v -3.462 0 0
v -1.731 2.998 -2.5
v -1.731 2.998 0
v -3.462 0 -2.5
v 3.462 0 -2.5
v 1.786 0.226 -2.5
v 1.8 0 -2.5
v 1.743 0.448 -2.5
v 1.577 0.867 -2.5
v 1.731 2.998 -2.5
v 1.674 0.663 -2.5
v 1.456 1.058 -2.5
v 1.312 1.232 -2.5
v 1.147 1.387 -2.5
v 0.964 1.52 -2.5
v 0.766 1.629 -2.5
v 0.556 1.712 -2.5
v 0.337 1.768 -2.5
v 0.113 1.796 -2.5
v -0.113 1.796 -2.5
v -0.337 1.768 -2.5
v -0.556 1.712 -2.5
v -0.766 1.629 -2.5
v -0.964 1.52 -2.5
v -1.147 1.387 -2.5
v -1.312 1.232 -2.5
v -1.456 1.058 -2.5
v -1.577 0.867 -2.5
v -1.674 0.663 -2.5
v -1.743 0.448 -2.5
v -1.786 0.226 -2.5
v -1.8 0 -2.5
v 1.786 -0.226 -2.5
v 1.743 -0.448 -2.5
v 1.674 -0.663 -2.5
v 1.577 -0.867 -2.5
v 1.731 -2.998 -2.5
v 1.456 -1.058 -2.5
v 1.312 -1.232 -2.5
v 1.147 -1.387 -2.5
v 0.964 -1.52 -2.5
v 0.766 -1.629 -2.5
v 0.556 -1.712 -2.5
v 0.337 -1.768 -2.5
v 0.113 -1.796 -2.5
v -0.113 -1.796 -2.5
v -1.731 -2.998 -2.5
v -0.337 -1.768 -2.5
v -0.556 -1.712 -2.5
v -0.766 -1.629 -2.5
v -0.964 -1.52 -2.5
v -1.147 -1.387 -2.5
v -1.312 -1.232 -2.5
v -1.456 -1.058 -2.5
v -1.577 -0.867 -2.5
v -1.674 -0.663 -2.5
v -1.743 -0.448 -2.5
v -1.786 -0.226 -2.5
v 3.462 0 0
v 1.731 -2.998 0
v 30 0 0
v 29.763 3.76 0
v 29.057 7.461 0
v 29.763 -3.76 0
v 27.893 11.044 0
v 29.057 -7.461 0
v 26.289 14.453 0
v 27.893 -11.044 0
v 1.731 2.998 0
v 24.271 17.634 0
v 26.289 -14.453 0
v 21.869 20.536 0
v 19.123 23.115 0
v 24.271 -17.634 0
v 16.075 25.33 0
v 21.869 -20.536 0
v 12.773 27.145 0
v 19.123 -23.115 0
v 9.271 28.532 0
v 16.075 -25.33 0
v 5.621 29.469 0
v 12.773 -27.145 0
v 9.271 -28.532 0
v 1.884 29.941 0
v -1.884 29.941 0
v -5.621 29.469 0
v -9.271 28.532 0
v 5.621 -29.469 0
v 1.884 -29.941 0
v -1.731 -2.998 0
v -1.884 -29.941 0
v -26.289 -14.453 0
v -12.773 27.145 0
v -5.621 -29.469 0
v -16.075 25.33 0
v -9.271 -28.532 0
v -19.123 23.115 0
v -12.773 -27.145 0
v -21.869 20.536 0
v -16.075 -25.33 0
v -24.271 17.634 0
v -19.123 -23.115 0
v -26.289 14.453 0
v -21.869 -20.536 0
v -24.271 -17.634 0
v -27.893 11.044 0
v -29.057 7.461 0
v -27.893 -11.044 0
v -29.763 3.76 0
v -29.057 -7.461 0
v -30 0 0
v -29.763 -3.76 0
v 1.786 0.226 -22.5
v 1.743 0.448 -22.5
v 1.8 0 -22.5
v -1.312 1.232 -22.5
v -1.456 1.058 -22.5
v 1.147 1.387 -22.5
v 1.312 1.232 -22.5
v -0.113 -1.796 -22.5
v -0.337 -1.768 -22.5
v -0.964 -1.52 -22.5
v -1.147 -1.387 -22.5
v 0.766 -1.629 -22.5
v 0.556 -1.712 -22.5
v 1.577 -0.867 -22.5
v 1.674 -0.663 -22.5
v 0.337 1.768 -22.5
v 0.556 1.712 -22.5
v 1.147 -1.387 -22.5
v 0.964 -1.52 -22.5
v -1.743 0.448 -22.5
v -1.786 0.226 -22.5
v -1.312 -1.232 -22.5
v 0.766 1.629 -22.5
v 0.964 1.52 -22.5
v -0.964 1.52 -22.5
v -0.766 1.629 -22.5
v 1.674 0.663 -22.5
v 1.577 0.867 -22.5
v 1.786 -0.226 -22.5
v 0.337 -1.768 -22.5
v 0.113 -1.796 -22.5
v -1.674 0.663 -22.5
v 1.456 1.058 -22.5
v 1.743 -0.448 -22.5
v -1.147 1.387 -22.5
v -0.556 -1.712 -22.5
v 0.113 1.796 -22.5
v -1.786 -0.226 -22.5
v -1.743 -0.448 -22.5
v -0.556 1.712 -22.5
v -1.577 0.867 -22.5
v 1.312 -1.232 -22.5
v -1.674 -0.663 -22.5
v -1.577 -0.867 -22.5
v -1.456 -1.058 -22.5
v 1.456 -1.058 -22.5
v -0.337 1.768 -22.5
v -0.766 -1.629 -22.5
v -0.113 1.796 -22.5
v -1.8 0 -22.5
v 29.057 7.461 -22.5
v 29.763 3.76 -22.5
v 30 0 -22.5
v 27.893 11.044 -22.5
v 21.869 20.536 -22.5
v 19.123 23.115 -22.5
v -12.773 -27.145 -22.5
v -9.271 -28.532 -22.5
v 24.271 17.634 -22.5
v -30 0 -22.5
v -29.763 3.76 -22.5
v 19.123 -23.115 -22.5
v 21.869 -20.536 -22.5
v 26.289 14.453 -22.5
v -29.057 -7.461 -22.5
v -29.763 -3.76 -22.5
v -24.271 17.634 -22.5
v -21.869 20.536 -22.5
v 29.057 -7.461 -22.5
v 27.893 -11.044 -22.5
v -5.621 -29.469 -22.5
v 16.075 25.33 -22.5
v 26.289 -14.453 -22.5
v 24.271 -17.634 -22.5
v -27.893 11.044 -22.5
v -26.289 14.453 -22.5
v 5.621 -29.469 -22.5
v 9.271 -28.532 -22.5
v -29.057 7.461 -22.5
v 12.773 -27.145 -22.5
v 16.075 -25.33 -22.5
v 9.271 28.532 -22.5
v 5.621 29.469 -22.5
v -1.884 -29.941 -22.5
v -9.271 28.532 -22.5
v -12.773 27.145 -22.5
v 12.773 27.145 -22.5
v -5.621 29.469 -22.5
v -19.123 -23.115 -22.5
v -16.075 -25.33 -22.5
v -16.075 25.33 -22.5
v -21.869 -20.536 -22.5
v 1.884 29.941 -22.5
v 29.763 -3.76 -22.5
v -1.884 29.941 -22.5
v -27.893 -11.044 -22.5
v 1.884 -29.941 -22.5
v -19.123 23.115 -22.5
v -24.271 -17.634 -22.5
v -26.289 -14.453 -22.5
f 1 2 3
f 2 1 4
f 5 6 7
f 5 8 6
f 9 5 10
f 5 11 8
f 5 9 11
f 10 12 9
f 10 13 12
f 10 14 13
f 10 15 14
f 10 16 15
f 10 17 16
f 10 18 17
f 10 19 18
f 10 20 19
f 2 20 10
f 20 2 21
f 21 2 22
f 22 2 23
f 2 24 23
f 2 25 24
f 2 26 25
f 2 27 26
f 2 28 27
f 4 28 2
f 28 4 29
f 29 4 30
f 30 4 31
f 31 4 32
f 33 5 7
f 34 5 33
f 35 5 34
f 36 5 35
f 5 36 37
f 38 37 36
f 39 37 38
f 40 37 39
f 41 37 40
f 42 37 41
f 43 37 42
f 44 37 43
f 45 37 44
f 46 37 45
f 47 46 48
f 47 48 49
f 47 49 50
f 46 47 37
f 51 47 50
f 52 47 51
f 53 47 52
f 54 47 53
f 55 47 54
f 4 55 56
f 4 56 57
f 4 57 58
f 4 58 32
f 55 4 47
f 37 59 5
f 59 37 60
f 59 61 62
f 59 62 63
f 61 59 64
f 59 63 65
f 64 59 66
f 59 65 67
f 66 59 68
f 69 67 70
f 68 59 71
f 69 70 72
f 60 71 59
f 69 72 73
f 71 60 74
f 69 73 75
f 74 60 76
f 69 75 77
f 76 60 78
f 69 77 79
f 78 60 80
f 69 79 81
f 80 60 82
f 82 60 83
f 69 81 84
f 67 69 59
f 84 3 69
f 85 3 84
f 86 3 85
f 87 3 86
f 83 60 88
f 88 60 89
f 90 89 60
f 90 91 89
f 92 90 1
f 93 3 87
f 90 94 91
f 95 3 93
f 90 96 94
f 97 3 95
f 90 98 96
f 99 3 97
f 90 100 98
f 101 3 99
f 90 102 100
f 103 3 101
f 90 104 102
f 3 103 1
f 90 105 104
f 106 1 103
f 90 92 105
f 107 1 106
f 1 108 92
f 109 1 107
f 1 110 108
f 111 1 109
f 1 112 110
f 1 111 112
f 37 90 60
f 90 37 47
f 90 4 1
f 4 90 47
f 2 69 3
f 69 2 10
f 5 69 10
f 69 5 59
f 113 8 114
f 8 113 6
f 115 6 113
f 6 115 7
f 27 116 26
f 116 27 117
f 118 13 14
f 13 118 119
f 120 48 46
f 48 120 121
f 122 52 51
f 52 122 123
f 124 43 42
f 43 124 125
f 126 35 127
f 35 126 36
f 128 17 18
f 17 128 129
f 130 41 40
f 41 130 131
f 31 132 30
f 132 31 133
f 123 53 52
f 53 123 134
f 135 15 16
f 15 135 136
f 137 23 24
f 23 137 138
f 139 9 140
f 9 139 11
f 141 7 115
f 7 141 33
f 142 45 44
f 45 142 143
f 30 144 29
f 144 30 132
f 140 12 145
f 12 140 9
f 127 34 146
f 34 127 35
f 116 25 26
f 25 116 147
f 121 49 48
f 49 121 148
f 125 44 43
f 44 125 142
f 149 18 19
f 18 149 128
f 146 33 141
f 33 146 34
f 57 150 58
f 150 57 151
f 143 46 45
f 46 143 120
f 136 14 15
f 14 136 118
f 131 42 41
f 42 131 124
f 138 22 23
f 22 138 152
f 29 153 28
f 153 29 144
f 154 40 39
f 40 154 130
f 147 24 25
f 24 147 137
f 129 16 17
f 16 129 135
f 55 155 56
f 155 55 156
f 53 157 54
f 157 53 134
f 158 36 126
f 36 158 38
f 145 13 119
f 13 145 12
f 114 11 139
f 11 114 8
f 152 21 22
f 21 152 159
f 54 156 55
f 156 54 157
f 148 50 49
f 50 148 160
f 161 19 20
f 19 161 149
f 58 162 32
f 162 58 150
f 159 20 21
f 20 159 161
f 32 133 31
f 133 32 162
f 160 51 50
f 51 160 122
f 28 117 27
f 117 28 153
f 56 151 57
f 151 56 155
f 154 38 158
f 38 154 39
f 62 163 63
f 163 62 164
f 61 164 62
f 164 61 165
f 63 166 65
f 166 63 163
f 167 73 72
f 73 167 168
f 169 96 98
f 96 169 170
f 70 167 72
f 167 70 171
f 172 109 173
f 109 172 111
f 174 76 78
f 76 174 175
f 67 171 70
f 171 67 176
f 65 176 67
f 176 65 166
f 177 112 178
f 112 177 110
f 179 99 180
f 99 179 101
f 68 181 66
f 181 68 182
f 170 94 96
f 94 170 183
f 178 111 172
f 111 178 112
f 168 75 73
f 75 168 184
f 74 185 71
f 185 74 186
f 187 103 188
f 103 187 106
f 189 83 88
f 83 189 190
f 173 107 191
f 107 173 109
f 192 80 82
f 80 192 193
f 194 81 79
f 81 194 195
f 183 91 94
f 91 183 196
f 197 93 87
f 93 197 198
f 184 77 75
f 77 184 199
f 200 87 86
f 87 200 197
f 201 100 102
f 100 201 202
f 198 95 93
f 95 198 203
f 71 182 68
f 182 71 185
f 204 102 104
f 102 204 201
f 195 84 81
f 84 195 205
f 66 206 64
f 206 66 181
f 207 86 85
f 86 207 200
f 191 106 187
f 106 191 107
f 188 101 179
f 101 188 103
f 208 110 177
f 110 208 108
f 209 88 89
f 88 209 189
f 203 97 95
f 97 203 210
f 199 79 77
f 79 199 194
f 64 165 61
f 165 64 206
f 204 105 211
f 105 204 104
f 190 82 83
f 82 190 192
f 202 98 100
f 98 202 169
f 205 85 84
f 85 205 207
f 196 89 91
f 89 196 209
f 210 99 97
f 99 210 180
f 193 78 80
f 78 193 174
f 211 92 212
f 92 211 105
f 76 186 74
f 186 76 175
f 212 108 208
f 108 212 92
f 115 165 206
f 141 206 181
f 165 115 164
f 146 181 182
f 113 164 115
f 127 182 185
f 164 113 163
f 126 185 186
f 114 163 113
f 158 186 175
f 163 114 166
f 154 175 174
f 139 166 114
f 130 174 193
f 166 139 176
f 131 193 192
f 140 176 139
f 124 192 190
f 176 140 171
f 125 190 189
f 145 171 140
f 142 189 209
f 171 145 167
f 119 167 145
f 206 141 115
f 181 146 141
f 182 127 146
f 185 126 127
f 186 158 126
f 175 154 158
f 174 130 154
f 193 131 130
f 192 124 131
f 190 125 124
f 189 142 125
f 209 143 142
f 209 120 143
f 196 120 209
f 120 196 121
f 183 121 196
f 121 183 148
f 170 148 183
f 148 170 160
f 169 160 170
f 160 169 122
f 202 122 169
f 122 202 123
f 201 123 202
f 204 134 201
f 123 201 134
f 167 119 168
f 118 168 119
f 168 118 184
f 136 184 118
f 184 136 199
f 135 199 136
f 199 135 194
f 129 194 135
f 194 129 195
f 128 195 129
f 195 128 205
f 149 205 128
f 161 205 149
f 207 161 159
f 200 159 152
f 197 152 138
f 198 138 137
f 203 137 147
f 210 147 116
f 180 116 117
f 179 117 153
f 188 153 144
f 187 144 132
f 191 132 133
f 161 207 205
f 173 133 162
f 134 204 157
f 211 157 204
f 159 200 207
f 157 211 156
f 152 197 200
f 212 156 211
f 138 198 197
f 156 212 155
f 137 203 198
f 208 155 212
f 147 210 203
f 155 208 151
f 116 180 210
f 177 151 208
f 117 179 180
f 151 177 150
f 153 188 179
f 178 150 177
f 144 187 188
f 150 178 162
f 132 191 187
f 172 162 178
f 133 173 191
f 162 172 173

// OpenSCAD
$fn = 50;

difference() {
	union() {
		translate(v = [0, 0, -22.5]) {
			cylinder(h = 22.5, r = 30.0);
		}
	}
	union() {
		translate(v = [0, 0, 0]) {
			rotate(a = [0, 0, 0]) {
				difference() {
					union() {
						translate(v = [0, 0, -2.5]) {
							linear_extrude(height = 2.5) {
								polygon(points = [[3.4619999999999997, 0.0], [1.7310000000000003, 2.9981799479017264], [-1.7309999999999992, 2.9981799479017264], [-3.4619999999999997, 4.2397272186481365e-16], [-1.7310000000000014, -2.998179947901726], [1.7309999999999977, -2.9981799479017277]]);
							}
						}
					}
					union();
				}
			}
		}
		#translate(v = [0, 0, -100.0]) {
			cylinder(h = 200, r = 1.8);
		}
	}
}
